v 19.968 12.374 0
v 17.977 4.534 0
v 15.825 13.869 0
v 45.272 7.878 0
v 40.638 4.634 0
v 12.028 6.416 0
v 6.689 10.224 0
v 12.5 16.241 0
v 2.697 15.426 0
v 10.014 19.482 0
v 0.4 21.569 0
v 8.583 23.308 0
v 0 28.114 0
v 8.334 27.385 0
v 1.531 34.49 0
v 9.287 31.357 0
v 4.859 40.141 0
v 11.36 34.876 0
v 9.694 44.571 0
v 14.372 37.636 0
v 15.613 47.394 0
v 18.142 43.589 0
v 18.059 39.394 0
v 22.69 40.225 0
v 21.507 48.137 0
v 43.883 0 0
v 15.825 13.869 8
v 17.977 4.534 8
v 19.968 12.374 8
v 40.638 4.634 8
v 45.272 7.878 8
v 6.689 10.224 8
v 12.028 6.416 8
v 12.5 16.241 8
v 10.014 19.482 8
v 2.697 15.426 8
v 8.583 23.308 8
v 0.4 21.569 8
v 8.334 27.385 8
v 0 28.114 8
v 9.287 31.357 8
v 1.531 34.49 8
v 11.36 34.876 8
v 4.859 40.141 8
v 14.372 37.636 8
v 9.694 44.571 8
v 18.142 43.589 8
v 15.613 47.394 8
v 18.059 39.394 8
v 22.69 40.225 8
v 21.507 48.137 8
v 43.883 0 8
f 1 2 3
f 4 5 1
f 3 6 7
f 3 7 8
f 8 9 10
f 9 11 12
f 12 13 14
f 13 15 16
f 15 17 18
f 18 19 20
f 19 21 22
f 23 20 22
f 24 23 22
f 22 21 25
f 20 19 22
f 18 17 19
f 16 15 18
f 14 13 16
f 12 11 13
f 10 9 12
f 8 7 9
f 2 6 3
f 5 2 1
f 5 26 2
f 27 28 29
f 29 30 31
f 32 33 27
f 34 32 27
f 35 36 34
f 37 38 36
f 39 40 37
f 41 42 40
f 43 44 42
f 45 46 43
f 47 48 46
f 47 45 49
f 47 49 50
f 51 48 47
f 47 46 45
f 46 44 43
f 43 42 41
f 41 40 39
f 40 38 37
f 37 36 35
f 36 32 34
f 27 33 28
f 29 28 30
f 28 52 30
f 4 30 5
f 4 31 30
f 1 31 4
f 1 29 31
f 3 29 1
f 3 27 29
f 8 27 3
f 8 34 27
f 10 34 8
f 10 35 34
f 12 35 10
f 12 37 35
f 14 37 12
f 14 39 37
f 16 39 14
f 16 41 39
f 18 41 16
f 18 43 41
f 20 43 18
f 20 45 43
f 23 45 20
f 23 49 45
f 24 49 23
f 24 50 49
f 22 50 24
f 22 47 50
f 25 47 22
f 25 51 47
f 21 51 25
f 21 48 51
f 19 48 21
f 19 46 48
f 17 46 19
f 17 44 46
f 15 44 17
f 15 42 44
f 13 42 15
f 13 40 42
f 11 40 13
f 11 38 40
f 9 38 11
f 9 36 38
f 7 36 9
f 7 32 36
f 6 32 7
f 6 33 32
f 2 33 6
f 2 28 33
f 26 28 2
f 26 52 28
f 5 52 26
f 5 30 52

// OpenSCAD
$fn = 32;

// ----------------------------------------------------------------------
// Hook plate: curl radius 18 mm over 170 degrees, 8 mm thick band
// ----------------------------------------------------------------------

// --- parameters (mm) ---
profile_height = 8;       // extrusion height
profile_points = 26;      // points of the closed outline

profile = [[18.142, 43.589], [21.507, 48.137], [15.613, 47.394], [9.694, 44.571], [4.859, 40.141], [1.531, 34.49], [0, 28.114], [0.4, 21.569], [2.697, 15.426], [6.689, 10.224], [12.028, 6.416], [17.977, 4.534], [43.883, 0], [40.638, 4.634], [45.272, 7.878], [19.968, 12.374], [15.825, 13.869], [12.5, 16.241], [10.014, 19.482], [8.583, 23.308], [8.334, 27.385], [9.287, 31.357], [11.36, 34.876], [14.372, 37.636], [18.059, 39.394], [22.69, 40.225]];  // single closed polygon, 26 points, counter clockwise

// --- the one profile operation ---
linear_extrude(height = profile_height) polygon(points = profile);
